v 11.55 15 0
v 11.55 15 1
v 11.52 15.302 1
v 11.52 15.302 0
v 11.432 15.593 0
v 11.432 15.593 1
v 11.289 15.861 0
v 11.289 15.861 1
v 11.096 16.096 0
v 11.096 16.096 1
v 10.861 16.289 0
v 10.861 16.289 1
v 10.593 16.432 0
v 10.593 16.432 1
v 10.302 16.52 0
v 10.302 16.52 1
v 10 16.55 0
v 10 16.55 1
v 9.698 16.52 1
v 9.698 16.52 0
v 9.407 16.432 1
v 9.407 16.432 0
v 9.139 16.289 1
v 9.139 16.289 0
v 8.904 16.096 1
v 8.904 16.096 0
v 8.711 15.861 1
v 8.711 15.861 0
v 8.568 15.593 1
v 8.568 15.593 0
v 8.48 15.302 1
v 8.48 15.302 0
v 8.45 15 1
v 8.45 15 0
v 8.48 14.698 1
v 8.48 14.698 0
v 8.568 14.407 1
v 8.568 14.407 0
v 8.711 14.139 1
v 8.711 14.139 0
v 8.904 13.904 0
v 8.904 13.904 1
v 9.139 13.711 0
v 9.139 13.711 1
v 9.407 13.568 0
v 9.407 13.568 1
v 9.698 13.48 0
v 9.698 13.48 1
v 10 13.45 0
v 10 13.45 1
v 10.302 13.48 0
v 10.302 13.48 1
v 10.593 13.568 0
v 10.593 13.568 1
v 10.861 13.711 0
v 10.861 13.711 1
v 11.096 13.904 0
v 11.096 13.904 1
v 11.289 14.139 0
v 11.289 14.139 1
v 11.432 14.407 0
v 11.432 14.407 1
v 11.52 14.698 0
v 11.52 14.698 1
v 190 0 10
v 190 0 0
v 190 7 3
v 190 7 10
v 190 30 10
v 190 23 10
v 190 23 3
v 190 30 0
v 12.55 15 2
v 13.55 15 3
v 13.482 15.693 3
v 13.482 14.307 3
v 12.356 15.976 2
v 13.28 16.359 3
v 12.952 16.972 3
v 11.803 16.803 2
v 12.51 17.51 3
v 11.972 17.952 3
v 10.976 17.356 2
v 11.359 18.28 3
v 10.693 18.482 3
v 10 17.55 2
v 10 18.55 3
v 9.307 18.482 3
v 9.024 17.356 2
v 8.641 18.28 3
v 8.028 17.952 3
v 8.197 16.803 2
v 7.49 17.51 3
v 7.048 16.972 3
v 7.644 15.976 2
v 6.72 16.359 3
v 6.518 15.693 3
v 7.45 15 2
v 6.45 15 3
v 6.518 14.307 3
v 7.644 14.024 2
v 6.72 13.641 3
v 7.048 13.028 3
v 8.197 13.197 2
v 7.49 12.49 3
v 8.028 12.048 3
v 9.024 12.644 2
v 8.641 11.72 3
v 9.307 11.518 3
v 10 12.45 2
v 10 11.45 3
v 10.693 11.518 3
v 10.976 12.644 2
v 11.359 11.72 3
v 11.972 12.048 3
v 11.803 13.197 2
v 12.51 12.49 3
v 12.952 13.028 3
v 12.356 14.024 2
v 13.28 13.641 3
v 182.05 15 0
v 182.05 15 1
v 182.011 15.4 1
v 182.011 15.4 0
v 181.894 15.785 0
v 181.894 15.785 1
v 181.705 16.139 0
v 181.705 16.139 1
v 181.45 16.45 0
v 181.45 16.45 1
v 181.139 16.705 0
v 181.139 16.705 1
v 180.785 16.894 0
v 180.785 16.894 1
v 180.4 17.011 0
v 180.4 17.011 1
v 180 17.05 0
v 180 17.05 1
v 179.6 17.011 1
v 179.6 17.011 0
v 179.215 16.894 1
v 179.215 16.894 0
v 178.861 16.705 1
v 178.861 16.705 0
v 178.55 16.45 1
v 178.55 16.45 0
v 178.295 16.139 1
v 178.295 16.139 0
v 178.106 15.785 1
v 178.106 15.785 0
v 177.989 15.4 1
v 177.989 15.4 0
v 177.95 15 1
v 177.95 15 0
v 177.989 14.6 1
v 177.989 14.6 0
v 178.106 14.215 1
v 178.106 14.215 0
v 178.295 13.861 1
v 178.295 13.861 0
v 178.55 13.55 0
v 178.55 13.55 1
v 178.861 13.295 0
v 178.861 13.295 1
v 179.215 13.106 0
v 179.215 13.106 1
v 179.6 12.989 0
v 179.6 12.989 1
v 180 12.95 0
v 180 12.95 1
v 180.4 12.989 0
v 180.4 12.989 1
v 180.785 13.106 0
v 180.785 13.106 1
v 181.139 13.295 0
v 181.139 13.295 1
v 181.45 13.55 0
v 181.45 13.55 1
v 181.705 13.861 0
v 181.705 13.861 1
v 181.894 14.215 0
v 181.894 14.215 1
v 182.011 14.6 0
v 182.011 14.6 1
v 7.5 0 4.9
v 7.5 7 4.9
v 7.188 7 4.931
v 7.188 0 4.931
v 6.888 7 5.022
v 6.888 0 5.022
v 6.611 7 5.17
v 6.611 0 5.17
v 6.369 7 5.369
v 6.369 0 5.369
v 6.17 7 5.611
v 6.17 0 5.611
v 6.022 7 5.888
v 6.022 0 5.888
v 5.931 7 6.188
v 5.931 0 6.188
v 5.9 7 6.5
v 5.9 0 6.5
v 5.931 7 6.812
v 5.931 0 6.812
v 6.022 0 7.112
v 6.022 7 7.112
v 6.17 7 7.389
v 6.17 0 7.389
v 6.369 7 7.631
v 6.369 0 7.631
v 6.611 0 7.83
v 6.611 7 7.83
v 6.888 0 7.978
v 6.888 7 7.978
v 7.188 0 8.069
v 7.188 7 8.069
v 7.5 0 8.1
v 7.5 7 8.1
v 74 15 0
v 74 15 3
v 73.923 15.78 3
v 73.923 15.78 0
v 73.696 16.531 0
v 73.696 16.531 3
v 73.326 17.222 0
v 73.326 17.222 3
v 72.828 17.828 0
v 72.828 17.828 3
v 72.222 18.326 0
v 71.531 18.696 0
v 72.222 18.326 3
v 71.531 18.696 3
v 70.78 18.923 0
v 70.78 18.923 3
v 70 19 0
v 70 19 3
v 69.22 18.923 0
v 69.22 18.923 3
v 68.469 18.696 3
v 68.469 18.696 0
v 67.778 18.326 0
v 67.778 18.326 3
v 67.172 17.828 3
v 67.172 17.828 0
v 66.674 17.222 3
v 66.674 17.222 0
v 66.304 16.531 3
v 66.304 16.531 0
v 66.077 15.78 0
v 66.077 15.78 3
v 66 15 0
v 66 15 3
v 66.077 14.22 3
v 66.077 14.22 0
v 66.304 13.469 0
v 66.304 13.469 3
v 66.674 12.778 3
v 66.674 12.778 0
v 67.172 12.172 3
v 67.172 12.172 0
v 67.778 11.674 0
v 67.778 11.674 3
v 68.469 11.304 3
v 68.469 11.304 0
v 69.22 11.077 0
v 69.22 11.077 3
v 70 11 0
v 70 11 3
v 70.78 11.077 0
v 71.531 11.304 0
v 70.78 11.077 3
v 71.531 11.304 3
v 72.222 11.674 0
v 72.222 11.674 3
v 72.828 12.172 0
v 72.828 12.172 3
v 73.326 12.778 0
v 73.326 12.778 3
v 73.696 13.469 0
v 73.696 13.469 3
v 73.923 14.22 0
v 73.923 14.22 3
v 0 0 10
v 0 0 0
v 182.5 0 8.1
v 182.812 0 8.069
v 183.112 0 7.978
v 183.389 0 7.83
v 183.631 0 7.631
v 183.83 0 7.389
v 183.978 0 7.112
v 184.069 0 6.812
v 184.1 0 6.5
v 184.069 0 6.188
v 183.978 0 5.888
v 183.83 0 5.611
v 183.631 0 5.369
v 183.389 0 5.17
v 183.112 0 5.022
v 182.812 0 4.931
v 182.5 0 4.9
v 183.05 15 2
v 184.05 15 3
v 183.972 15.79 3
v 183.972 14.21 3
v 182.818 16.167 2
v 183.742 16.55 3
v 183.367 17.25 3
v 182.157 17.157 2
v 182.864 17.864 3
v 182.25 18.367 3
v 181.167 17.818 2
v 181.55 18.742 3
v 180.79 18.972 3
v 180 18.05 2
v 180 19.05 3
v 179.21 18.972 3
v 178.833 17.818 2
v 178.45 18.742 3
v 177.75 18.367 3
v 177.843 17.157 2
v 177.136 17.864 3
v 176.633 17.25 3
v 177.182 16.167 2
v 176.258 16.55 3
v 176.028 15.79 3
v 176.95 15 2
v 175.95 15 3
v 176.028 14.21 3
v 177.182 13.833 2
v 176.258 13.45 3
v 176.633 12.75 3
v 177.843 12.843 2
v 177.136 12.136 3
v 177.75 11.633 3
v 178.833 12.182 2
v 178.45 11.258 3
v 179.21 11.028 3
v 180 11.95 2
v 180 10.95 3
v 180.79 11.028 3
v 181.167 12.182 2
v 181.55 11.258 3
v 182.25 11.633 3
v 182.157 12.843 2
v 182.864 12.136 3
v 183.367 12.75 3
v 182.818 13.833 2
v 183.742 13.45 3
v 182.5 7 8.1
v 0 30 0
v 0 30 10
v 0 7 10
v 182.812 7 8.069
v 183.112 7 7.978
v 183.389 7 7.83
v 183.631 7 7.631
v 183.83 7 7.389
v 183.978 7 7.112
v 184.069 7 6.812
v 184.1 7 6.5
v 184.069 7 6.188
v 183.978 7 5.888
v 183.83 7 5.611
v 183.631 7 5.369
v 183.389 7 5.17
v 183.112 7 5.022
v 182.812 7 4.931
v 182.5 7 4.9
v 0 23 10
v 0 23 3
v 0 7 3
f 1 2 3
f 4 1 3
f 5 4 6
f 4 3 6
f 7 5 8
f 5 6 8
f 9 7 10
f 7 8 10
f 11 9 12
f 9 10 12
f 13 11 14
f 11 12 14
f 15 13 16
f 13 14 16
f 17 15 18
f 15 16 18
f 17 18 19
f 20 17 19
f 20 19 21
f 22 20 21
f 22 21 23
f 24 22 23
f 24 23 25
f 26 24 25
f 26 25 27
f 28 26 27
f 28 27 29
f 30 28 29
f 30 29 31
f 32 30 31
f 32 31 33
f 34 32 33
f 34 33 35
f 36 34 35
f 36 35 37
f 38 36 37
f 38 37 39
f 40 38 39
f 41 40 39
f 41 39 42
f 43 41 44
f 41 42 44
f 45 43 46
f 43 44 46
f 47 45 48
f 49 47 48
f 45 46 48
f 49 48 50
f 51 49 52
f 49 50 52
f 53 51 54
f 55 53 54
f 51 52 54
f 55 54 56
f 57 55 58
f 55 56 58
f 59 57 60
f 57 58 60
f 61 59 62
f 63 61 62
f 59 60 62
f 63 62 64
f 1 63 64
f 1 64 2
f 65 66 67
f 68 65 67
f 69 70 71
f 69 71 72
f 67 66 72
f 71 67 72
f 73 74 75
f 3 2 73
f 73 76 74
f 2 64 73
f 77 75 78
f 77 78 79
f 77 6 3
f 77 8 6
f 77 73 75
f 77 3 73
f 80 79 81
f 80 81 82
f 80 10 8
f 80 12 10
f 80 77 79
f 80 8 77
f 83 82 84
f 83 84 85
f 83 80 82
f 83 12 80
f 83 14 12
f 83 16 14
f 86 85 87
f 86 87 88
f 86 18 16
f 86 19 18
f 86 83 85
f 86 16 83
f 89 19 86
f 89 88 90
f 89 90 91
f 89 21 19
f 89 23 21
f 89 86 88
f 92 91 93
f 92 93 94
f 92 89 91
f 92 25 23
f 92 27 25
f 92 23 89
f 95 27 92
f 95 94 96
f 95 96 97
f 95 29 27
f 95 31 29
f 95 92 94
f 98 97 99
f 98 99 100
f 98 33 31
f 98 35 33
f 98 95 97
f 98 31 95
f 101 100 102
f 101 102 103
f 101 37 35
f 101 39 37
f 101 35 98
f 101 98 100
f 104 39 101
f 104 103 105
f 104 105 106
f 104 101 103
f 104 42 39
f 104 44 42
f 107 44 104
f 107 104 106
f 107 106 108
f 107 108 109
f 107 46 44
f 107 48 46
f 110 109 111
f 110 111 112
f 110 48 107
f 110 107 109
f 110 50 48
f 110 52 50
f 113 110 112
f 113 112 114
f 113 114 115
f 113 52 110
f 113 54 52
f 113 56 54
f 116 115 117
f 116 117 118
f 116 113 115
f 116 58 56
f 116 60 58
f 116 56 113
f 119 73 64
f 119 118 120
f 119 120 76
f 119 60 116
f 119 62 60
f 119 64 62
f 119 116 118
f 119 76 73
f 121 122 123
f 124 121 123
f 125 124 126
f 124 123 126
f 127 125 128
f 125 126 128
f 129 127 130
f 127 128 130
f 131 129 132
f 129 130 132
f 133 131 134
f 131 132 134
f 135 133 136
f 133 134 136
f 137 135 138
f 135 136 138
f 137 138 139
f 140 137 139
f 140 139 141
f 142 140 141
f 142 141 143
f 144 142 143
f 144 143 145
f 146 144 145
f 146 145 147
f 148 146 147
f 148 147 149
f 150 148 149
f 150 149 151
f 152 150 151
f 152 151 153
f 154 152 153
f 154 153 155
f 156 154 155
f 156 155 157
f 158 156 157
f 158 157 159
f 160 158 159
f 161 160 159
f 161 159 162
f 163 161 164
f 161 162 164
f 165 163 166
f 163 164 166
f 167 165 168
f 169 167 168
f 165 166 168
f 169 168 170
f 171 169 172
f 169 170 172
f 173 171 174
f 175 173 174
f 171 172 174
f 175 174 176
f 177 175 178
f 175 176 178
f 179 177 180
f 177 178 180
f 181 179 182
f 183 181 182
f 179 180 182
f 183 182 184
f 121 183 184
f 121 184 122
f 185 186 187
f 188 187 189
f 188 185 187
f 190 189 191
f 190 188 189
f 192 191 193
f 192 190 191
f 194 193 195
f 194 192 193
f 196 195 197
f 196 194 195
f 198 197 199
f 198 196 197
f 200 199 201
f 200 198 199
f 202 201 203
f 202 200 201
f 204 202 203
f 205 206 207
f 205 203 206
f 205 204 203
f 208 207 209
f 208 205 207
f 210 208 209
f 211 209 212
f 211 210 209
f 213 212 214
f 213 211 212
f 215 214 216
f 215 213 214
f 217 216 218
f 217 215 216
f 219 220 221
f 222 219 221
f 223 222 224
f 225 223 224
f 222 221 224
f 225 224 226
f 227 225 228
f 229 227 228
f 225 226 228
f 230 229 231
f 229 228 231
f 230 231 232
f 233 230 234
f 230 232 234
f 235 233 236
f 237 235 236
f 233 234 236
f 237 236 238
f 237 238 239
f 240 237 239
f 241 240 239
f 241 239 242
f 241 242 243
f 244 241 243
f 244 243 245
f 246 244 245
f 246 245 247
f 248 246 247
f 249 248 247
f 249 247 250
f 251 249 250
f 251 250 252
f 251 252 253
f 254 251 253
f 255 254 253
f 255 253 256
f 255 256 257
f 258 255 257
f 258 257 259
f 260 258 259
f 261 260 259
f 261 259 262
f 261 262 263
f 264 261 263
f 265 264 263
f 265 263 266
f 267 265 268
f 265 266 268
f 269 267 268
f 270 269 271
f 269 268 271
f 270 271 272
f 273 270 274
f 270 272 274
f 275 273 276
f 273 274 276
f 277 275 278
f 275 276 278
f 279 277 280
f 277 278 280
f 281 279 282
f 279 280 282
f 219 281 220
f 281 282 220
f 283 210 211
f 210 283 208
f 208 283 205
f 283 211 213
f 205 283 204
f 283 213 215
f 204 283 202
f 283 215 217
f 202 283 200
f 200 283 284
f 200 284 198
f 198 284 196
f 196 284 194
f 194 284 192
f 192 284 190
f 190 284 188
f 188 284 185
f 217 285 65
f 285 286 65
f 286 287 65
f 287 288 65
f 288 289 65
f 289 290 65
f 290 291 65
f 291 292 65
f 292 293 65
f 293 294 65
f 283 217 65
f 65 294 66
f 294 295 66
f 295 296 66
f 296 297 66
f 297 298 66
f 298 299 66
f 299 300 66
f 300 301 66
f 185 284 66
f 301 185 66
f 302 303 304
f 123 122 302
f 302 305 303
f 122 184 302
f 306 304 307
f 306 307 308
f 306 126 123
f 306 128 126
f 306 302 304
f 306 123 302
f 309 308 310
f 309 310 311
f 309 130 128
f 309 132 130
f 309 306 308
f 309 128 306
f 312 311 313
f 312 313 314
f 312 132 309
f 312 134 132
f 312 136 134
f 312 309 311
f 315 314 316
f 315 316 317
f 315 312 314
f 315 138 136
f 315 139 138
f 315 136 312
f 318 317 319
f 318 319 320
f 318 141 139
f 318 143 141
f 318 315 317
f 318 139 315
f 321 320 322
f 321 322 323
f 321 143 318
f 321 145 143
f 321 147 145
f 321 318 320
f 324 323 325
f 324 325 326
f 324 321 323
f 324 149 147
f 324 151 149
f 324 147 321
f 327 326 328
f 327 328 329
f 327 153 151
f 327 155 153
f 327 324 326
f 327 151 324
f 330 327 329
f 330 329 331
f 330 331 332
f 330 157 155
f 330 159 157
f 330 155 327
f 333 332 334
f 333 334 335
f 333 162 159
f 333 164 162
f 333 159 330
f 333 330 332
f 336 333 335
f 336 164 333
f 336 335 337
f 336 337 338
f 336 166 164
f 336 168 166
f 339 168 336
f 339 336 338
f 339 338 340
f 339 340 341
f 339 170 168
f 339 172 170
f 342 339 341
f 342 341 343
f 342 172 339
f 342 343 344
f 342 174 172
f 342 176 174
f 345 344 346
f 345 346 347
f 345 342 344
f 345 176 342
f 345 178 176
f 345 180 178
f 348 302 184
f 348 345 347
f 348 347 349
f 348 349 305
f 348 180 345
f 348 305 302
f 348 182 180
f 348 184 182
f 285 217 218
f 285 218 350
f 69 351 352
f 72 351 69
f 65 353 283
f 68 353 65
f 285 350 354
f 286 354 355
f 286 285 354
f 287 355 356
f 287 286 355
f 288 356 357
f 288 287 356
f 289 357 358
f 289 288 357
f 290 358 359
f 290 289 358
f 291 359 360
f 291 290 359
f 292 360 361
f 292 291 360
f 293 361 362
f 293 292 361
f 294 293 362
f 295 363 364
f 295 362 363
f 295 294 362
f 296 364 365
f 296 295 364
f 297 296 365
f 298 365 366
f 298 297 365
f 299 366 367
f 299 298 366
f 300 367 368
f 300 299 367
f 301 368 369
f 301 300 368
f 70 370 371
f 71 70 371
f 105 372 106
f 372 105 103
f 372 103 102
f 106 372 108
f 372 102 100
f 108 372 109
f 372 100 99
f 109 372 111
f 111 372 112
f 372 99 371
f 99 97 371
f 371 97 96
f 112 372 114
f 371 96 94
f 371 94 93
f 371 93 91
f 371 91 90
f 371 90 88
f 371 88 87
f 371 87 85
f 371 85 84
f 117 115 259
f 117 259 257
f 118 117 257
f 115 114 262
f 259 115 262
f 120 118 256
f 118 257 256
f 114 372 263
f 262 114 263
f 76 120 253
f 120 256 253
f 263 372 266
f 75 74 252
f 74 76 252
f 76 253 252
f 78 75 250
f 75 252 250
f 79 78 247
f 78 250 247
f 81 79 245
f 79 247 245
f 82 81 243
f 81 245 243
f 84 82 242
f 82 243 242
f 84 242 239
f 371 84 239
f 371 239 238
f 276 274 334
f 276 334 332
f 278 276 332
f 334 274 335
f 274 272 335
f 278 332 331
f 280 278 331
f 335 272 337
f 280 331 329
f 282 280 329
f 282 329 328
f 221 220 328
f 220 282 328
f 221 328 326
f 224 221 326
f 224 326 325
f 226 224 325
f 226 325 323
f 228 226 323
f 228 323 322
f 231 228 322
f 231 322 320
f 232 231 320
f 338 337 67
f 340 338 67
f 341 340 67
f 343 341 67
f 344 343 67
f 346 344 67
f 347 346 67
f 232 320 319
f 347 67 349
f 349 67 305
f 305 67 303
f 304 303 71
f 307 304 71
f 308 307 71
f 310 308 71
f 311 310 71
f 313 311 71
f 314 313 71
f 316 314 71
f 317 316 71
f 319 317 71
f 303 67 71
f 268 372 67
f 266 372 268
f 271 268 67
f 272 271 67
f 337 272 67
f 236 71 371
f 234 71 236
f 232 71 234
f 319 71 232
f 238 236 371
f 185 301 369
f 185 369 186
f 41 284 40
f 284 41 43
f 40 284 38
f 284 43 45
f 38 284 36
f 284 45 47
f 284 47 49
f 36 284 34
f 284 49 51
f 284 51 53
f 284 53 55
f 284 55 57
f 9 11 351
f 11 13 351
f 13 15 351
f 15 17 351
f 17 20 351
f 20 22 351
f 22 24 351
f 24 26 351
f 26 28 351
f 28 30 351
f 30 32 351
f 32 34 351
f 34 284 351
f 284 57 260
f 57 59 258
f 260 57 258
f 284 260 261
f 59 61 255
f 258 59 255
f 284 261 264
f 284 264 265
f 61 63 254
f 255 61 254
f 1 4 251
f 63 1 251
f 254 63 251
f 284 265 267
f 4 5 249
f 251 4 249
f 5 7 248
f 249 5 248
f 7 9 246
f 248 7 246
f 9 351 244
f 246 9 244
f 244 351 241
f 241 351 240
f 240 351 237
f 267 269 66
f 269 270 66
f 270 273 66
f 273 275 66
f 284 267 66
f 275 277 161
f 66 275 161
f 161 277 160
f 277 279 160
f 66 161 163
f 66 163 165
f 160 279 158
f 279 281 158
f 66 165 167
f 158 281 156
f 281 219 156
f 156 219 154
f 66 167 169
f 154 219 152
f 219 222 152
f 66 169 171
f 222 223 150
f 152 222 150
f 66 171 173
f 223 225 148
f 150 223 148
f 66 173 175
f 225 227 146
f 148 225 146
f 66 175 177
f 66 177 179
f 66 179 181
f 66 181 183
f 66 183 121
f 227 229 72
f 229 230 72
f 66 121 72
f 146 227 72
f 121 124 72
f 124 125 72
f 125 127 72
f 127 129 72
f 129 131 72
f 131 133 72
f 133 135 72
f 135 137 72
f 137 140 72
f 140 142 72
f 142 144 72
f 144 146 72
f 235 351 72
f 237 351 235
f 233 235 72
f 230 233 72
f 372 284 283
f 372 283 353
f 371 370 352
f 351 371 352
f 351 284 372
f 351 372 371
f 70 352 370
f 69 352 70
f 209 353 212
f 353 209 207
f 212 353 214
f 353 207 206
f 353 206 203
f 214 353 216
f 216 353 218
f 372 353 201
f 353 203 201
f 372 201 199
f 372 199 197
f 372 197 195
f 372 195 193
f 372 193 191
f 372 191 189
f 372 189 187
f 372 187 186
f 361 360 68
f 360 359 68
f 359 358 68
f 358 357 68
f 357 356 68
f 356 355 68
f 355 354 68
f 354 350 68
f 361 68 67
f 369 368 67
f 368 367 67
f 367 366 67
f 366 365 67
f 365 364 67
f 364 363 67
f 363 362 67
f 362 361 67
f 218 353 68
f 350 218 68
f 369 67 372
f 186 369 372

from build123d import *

# Parameters (mm, degrees)
SKETCH1_W           = 190
SKETCH1_H           = 30
BOSS_EXTRUDE1_DEPTH = 10
SKETCH2_W           = 7
SKETCH2_H           = 16
CUT_EXTRUDE1_DEPTH  = 191
CUT_EXTRUDE2_REACH  = 32
SKETCH4_R           = 2.05
SKETCH4_R_2         = 1.55
SKETCH4_R_3         = 4
CUT_EXTRUDE3_DEPTH  = 4
CHAMFER1_SIZE       = 2
CHAMFER2_SIZE       = 2


with BuildPart() as part:
    # Sketch1 → Boss-Extrude1 (new body)
    with BuildSketch(Plane.XY):
        with Locations((95, 15)):
            Rectangle(SKETCH1_W, SKETCH1_H)
    extrude(amount=BOSS_EXTRUDE1_DEPTH)

    # Sketch2 → Cut-Extrude1 (cut, through all)
    with BuildSketch(Plane(origin=(190, 0, 0), x_dir=(0, 0, -1), z_dir=(1, 0, 0))):
        with Locations((-6.5, 15)):
            Rectangle(SKETCH2_W, SKETCH2_H)
    extrude(amount=-CUT_EXTRUDE1_DEPTH, mode=Mode.SUBTRACT)

    # Sketch3 → Cut-Extrude2 (cut, up to next)
    with BuildSketch(Plane.XZ, mode=Mode.PRIVATE) as cut_extrude2_sk1:
        with BuildLine():
            Line((7.5, 8.1), (182.5, 8.1))
            ThreePointArc((182.5, 8.1), (184.1, 6.5), (182.5, 4.9))
            Line((182.5, 4.9), (7.5, 4.9))
            ThreePointArc((7.5, 4.9), (5.9, 6.5), (7.5, 8.1))
        make_face()
    cut_extrude2_tool1 = extrude(cut_extrude2_sk1.sketch, amount=-CUT_EXTRUDE2_REACH, mode=Mode.PRIVATE) & part.part
    add(cut_extrude2_tool1.solids().sort_by_distance((95, 0, 6.5))[0], mode=Mode.SUBTRACT)

    # Sketch4 → Cut-Extrude3 (cut, through all)
    with BuildSketch(Plane.XY.offset(3)):
        with Locations((180, 15)):
            Circle(SKETCH4_R)
        with Locations((10, 15)):
            Circle(SKETCH4_R_2)
        with Locations((70, 15)):
            Circle(SKETCH4_R_3)
    extrude(amount=-CUT_EXTRUDE3_DEPTH, mode=Mode.SUBTRACT)

    # Chamfer1
    chamfer1_edges = [part.edges().sort_by_distance(p)[0] for p in [
        (177.95, 15, 3),
    ]]
    chamfer(chamfer1_edges, length=CHAMFER1_SIZE)

    # Chamfer2
    chamfer2_edges = [part.edges().sort_by_distance(p)[0] for p in [
        (8.45, 15, 3),
    ]]
    chamfer(chamfer2_edges, length=CHAMFER2_SIZE)


solid = part.part
